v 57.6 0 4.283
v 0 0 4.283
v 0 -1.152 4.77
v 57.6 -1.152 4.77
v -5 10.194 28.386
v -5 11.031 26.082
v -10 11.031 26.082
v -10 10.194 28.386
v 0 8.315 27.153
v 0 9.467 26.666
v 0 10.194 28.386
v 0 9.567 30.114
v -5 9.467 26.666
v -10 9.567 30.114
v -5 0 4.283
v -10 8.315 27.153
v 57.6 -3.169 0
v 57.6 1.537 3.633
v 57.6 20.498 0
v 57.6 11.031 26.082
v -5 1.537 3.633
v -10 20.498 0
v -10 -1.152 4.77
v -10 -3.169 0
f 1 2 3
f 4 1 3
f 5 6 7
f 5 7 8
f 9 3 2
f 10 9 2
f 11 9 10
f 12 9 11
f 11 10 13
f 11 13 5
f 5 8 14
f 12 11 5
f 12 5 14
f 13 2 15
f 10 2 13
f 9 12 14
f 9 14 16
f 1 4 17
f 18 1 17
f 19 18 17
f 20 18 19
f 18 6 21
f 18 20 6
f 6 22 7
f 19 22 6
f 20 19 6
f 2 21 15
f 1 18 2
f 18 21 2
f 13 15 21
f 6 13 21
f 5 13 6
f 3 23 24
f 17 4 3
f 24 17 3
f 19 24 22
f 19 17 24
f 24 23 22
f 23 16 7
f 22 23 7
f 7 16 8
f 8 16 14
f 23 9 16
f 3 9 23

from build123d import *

# Parameters (mm, degrees)
F1_DEPTH = 57.6
F2_DEPTH = 5
F3_START = -5
F3_DEPTH = 5


# Not quite as in the source:
# - a feature names something its author has since deleted; it is built from what else it names


with BuildPart() as f1:
    # F0 (on Right) → F1 (new body)
    with BuildSketch(Plane.YZ):
        Polygon((1.5365748771, 3.633035603), (0, 0), (20.4984284937, 0), (11.0311029763, 26.0816380962), align=None)
        Polygon((0, 4.2829225325), (0, 0), (1.5365748771, 3.633035603), align=None)
        Polygon((-1.811441418, 0), (0, 0), (0, 4.2829225325), align=None)
        Polygon((-1.811441418, 0), (0, 4.2829225325), (-1.1518723498, 4.7701013845), (-3.1693637124, 0), align=None)
    extrude(amount=F1_DEPTH)

    # F0 (on Right) → F2 (join)
    with BuildSketch(Plane.YZ):
        Polygon((-1.1518723498, 4.7701013845), (0, 4.2829225325), (9.4668246651, 26.666023784), (10.1944775948, 28.3864664644), (9.5673128152, 30.1142495409), (8.3149523153, 27.153202636), align=None)
        Polygon((1.5365748771, 3.633035603), (0, 0), (20.4984284937, 0), (11.0311029763, 26.0816380962), align=None)
        Polygon((-1.811441418, 0), (0, 0), (0, 4.2829225325), align=None)
        Polygon((-1.811441418, 0), (0, 4.2829225325), (-1.1518723498, 4.7701013845), (-3.1693637124, 0), align=None)
        Polygon((0, 4.2829225325), (0, 0), (1.5365748771, 3.633035603), align=None)
    extrude(amount=-F2_DEPTH)

    # F0 (on Right) → F3 (join)
    with BuildSketch(Plane.YZ.offset(F3_START)):
        Polygon((-1.1518723498, 4.7701013845), (0, 4.2829225325), (9.4668246651, 26.666023784), (10.1944775948, 28.3864664644), (9.5673128152, 30.1142495409), (8.3149523153, 27.153202636), align=None)
        Polygon((0, 4.2829225325), (1.5365748771, 3.633035603), (11.0311029763, 26.0816380962), (10.1944775948, 28.3864664644), (9.4668246651, 26.666023784), align=None)
        Polygon((1.5365748771, 3.633035603), (0, 0), (20.4984284937, 0), (11.0311029763, 26.0816380962), align=None)
        Polygon((0, 4.2829225325), (0, 0), (1.5365748771, 3.633035603), align=None)
        Polygon((-1.811441418, 0), (0, 0), (0, 4.2829225325), align=None)
        Polygon((-1.811441418, 0), (0, 4.2829225325), (-1.1518723498, 4.7701013845), (-3.1693637124, 0), align=None)
    extrude(amount=-F3_DEPTH)


solid = f1.part
